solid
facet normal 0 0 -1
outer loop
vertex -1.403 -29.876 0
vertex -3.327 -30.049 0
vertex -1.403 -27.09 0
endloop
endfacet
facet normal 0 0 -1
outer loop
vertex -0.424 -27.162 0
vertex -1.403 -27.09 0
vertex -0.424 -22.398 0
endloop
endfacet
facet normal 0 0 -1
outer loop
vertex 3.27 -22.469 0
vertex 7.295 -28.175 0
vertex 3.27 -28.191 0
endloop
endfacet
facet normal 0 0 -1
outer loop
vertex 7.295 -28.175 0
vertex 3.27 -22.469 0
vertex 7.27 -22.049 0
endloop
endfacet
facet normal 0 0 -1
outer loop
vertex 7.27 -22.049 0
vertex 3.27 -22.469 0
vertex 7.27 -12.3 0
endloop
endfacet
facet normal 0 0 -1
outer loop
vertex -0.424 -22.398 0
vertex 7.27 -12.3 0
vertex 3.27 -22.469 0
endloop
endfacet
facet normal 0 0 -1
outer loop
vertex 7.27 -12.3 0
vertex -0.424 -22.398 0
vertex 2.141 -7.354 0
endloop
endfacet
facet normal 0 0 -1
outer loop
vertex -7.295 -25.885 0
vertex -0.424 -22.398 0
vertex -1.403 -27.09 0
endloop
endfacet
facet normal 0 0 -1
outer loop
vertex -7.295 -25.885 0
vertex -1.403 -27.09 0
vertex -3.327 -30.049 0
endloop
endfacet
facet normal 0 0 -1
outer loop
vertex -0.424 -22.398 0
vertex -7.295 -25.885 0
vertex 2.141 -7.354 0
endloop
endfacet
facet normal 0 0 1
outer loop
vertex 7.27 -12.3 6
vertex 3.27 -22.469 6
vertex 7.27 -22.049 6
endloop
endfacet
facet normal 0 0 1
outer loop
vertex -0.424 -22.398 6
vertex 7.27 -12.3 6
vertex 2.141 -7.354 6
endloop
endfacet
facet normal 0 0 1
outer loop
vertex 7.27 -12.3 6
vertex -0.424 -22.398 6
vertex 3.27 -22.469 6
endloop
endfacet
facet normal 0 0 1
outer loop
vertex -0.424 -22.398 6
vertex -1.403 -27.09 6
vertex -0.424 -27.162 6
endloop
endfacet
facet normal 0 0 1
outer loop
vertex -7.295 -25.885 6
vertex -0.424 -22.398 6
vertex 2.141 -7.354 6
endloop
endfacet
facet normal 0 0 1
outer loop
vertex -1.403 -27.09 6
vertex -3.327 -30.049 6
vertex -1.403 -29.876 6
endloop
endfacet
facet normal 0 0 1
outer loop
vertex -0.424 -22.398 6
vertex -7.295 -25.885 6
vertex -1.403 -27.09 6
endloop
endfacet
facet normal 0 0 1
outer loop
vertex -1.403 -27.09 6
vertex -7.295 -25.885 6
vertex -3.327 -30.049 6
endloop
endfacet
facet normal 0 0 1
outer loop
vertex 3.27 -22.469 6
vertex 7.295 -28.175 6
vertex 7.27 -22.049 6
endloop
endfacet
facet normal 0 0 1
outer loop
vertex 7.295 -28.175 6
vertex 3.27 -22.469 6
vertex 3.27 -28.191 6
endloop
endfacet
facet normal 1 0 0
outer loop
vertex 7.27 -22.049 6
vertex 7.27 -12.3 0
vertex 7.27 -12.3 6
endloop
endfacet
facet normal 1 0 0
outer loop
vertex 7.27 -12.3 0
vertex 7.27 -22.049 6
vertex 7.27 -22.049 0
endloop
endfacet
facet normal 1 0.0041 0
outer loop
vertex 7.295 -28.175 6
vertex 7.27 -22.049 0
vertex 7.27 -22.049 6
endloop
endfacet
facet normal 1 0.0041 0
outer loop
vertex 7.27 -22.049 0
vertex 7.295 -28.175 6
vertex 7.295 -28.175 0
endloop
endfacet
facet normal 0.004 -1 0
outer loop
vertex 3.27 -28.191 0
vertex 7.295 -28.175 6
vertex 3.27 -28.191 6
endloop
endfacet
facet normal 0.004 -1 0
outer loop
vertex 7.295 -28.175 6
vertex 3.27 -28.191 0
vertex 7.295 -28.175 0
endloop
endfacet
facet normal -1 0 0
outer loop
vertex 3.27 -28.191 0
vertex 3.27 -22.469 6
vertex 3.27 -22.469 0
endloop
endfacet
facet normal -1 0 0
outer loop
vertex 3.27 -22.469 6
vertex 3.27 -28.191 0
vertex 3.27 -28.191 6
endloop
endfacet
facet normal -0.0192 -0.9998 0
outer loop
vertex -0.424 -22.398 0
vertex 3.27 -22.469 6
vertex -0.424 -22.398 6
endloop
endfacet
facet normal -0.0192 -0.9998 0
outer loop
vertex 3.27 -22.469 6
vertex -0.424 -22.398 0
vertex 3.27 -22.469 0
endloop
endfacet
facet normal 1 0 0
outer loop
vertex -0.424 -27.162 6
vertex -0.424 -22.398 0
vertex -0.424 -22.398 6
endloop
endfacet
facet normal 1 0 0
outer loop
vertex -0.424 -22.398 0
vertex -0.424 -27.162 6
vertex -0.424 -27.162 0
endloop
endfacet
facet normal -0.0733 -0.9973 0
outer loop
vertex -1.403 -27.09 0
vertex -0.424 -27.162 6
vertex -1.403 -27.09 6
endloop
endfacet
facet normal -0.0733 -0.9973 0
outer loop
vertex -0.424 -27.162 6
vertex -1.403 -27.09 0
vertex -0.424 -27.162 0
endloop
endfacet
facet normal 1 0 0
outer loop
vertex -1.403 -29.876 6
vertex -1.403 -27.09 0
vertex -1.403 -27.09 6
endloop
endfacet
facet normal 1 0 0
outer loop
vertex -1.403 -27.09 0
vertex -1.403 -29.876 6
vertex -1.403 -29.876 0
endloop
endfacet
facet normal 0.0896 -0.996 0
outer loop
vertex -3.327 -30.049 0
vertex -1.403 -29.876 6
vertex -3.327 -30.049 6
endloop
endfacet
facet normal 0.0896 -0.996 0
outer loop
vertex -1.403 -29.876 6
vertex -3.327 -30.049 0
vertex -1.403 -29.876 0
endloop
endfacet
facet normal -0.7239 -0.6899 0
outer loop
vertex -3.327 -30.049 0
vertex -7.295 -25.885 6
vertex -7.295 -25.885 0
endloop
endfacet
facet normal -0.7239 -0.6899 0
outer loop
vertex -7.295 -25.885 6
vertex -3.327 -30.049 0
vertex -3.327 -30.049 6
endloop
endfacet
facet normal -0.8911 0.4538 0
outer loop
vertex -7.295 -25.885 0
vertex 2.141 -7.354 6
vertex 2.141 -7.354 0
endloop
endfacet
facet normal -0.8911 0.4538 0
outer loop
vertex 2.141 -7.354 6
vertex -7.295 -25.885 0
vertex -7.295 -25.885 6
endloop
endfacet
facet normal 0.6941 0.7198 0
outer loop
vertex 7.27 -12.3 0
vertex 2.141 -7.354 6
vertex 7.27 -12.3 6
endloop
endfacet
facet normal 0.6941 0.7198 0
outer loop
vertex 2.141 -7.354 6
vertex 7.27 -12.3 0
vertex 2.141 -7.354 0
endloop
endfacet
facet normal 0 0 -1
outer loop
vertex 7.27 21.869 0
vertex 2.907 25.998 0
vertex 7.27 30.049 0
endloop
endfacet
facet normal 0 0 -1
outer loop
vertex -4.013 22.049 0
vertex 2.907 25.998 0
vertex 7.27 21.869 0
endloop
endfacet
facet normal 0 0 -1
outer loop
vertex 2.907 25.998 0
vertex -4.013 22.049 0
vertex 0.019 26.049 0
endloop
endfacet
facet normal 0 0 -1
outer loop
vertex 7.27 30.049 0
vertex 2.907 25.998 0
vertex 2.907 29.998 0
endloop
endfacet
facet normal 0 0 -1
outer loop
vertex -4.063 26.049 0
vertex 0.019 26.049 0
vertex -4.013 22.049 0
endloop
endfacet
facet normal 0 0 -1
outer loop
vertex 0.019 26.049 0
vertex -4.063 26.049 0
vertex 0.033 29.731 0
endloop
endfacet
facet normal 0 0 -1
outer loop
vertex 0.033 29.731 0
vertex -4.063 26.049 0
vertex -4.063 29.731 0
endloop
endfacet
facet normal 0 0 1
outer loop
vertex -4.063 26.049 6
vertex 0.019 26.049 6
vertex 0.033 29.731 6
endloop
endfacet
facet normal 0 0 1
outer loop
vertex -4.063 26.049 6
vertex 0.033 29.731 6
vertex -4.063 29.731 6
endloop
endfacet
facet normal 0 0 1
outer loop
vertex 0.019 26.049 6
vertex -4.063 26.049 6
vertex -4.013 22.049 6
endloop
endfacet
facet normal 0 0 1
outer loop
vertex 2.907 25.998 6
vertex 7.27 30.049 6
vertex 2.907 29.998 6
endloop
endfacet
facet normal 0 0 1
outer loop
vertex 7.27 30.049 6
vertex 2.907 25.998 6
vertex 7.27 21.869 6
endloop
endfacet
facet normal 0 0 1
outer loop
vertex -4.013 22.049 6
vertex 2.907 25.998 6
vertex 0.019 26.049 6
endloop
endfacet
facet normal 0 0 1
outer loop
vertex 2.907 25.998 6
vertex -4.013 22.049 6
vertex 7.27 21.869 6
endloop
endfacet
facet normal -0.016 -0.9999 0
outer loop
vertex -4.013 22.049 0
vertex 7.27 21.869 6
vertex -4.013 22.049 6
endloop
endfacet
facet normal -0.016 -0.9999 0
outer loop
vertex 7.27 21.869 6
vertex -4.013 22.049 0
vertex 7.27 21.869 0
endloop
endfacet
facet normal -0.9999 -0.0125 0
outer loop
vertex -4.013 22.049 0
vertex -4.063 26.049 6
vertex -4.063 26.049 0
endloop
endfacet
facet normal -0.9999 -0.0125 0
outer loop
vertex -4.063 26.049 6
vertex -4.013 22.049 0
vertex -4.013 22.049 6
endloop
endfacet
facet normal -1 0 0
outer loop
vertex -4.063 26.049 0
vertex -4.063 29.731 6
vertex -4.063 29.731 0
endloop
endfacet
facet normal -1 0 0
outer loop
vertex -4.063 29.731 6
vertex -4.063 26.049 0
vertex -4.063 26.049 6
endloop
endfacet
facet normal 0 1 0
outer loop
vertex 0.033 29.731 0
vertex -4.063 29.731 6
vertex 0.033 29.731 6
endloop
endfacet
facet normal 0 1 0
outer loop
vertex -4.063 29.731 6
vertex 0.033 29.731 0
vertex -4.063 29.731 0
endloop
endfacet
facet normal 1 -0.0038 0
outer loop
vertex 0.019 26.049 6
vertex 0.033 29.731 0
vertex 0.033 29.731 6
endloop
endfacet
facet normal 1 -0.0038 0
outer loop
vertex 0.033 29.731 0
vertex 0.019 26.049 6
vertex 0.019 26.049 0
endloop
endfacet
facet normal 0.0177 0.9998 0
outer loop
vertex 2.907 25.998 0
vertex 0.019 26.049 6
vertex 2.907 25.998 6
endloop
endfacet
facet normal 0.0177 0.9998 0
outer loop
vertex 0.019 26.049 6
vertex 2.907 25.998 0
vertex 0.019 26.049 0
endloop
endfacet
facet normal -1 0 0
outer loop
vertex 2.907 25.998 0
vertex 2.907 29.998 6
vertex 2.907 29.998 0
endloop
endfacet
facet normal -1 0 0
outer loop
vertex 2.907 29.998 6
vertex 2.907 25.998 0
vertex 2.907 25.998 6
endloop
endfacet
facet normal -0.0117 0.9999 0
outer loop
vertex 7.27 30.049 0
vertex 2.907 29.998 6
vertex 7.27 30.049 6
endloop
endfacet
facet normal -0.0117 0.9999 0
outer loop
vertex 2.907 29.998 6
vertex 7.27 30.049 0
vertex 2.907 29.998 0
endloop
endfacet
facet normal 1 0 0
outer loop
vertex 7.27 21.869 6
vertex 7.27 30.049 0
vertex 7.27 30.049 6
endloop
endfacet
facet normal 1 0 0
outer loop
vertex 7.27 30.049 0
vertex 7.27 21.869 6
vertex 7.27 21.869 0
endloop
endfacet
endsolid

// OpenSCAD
// Generated by inkscape 0.91 r13725 + inkscape-paths2openscad 0.25
// Tue May 19 15:11:32 2020 from "filter_tri_stand.svg"

// Module names are of the form poly_<inkscape-path-id>().  As a result,
// you can associate a polygon in this OpenSCAD program with the corresponding
// SVG element in the Inkscape document by looking for the XML element with
// the attribute id="inkscape-path-id".

// fudge value is used to ensure that subtracted solids are a tad taller
// in the z dimension than the polygon being subtracted from.  This helps
// keep the resulting .stl file manifold.
fudge = 0.1;
zsize = 6;
line_fn = 4;
min_line_width = 1.0;
line_width_scale = 1.0;
function min_line_mm(w) = max(min_line_width, w * line_width_scale) * 90/25.4;


path41383_0_center = [0.000000,66.264640];
path41383_0_points = [[25.758507,43.582490],[25.758507,78.126000],[25.847797,99.832490],[11.585281,99.888490],[11.585281,79.615220],[-1.501329,79.362680],[-1.501329,96.242130],[-4.970889,95.989590],[-4.970889,105.858880],[-11.789419,106.472420],[-25.847797,91.716780],[7.585274,26.056860],[25.758507,43.582490]];
module poly_path41383(h, w, s, res=line_fn)
{
  scale([25.4/90, -25.4/90, 1]) union()
  {
    translate (path41383_0_center) linear_extrude(height=h, convexity=10, scale=0.01*s)
      translate (-path41383_0_center) polygon(path41383_0_points);
  }
}

path41386_0_center = [5.680330,-91.980675];
path41386_0_points = [[25.758507,-92.299190],[25.758507,-77.488930],[-14.219277,-78.125960],[-14.397847,-92.299190],[-14.397847,-105.346080],[0.118562,-105.345840],[0.066432,-92.299190],[10.299558,-92.120620],[10.299558,-106.293850],[25.758502,-106.472420],[25.758507,-92.299190]];
module poly_path41386(h, w, s, res=line_fn)
{
  scale([25.4/90, -25.4/90, 1]) union()
  {
    translate (path41386_0_center) linear_extrude(height=h, convexity=10, scale=0.01*s)
      translate (-path41386_0_center) polygon(path41386_0_points);
  }
}

module filter_tri_stand_60(h)
{
  difference()
  {
    union()
    {
      translate ([0,0,0]) poly_path41383(h, min_line_mm(0.282222222222), 100.0);
      translate ([0,0,0]) poly_path41386(h, min_line_mm(0.282222222222), 100.0);
    }
    union()
    {
    }
  }
}

filter_tri_stand_60(zsize);
